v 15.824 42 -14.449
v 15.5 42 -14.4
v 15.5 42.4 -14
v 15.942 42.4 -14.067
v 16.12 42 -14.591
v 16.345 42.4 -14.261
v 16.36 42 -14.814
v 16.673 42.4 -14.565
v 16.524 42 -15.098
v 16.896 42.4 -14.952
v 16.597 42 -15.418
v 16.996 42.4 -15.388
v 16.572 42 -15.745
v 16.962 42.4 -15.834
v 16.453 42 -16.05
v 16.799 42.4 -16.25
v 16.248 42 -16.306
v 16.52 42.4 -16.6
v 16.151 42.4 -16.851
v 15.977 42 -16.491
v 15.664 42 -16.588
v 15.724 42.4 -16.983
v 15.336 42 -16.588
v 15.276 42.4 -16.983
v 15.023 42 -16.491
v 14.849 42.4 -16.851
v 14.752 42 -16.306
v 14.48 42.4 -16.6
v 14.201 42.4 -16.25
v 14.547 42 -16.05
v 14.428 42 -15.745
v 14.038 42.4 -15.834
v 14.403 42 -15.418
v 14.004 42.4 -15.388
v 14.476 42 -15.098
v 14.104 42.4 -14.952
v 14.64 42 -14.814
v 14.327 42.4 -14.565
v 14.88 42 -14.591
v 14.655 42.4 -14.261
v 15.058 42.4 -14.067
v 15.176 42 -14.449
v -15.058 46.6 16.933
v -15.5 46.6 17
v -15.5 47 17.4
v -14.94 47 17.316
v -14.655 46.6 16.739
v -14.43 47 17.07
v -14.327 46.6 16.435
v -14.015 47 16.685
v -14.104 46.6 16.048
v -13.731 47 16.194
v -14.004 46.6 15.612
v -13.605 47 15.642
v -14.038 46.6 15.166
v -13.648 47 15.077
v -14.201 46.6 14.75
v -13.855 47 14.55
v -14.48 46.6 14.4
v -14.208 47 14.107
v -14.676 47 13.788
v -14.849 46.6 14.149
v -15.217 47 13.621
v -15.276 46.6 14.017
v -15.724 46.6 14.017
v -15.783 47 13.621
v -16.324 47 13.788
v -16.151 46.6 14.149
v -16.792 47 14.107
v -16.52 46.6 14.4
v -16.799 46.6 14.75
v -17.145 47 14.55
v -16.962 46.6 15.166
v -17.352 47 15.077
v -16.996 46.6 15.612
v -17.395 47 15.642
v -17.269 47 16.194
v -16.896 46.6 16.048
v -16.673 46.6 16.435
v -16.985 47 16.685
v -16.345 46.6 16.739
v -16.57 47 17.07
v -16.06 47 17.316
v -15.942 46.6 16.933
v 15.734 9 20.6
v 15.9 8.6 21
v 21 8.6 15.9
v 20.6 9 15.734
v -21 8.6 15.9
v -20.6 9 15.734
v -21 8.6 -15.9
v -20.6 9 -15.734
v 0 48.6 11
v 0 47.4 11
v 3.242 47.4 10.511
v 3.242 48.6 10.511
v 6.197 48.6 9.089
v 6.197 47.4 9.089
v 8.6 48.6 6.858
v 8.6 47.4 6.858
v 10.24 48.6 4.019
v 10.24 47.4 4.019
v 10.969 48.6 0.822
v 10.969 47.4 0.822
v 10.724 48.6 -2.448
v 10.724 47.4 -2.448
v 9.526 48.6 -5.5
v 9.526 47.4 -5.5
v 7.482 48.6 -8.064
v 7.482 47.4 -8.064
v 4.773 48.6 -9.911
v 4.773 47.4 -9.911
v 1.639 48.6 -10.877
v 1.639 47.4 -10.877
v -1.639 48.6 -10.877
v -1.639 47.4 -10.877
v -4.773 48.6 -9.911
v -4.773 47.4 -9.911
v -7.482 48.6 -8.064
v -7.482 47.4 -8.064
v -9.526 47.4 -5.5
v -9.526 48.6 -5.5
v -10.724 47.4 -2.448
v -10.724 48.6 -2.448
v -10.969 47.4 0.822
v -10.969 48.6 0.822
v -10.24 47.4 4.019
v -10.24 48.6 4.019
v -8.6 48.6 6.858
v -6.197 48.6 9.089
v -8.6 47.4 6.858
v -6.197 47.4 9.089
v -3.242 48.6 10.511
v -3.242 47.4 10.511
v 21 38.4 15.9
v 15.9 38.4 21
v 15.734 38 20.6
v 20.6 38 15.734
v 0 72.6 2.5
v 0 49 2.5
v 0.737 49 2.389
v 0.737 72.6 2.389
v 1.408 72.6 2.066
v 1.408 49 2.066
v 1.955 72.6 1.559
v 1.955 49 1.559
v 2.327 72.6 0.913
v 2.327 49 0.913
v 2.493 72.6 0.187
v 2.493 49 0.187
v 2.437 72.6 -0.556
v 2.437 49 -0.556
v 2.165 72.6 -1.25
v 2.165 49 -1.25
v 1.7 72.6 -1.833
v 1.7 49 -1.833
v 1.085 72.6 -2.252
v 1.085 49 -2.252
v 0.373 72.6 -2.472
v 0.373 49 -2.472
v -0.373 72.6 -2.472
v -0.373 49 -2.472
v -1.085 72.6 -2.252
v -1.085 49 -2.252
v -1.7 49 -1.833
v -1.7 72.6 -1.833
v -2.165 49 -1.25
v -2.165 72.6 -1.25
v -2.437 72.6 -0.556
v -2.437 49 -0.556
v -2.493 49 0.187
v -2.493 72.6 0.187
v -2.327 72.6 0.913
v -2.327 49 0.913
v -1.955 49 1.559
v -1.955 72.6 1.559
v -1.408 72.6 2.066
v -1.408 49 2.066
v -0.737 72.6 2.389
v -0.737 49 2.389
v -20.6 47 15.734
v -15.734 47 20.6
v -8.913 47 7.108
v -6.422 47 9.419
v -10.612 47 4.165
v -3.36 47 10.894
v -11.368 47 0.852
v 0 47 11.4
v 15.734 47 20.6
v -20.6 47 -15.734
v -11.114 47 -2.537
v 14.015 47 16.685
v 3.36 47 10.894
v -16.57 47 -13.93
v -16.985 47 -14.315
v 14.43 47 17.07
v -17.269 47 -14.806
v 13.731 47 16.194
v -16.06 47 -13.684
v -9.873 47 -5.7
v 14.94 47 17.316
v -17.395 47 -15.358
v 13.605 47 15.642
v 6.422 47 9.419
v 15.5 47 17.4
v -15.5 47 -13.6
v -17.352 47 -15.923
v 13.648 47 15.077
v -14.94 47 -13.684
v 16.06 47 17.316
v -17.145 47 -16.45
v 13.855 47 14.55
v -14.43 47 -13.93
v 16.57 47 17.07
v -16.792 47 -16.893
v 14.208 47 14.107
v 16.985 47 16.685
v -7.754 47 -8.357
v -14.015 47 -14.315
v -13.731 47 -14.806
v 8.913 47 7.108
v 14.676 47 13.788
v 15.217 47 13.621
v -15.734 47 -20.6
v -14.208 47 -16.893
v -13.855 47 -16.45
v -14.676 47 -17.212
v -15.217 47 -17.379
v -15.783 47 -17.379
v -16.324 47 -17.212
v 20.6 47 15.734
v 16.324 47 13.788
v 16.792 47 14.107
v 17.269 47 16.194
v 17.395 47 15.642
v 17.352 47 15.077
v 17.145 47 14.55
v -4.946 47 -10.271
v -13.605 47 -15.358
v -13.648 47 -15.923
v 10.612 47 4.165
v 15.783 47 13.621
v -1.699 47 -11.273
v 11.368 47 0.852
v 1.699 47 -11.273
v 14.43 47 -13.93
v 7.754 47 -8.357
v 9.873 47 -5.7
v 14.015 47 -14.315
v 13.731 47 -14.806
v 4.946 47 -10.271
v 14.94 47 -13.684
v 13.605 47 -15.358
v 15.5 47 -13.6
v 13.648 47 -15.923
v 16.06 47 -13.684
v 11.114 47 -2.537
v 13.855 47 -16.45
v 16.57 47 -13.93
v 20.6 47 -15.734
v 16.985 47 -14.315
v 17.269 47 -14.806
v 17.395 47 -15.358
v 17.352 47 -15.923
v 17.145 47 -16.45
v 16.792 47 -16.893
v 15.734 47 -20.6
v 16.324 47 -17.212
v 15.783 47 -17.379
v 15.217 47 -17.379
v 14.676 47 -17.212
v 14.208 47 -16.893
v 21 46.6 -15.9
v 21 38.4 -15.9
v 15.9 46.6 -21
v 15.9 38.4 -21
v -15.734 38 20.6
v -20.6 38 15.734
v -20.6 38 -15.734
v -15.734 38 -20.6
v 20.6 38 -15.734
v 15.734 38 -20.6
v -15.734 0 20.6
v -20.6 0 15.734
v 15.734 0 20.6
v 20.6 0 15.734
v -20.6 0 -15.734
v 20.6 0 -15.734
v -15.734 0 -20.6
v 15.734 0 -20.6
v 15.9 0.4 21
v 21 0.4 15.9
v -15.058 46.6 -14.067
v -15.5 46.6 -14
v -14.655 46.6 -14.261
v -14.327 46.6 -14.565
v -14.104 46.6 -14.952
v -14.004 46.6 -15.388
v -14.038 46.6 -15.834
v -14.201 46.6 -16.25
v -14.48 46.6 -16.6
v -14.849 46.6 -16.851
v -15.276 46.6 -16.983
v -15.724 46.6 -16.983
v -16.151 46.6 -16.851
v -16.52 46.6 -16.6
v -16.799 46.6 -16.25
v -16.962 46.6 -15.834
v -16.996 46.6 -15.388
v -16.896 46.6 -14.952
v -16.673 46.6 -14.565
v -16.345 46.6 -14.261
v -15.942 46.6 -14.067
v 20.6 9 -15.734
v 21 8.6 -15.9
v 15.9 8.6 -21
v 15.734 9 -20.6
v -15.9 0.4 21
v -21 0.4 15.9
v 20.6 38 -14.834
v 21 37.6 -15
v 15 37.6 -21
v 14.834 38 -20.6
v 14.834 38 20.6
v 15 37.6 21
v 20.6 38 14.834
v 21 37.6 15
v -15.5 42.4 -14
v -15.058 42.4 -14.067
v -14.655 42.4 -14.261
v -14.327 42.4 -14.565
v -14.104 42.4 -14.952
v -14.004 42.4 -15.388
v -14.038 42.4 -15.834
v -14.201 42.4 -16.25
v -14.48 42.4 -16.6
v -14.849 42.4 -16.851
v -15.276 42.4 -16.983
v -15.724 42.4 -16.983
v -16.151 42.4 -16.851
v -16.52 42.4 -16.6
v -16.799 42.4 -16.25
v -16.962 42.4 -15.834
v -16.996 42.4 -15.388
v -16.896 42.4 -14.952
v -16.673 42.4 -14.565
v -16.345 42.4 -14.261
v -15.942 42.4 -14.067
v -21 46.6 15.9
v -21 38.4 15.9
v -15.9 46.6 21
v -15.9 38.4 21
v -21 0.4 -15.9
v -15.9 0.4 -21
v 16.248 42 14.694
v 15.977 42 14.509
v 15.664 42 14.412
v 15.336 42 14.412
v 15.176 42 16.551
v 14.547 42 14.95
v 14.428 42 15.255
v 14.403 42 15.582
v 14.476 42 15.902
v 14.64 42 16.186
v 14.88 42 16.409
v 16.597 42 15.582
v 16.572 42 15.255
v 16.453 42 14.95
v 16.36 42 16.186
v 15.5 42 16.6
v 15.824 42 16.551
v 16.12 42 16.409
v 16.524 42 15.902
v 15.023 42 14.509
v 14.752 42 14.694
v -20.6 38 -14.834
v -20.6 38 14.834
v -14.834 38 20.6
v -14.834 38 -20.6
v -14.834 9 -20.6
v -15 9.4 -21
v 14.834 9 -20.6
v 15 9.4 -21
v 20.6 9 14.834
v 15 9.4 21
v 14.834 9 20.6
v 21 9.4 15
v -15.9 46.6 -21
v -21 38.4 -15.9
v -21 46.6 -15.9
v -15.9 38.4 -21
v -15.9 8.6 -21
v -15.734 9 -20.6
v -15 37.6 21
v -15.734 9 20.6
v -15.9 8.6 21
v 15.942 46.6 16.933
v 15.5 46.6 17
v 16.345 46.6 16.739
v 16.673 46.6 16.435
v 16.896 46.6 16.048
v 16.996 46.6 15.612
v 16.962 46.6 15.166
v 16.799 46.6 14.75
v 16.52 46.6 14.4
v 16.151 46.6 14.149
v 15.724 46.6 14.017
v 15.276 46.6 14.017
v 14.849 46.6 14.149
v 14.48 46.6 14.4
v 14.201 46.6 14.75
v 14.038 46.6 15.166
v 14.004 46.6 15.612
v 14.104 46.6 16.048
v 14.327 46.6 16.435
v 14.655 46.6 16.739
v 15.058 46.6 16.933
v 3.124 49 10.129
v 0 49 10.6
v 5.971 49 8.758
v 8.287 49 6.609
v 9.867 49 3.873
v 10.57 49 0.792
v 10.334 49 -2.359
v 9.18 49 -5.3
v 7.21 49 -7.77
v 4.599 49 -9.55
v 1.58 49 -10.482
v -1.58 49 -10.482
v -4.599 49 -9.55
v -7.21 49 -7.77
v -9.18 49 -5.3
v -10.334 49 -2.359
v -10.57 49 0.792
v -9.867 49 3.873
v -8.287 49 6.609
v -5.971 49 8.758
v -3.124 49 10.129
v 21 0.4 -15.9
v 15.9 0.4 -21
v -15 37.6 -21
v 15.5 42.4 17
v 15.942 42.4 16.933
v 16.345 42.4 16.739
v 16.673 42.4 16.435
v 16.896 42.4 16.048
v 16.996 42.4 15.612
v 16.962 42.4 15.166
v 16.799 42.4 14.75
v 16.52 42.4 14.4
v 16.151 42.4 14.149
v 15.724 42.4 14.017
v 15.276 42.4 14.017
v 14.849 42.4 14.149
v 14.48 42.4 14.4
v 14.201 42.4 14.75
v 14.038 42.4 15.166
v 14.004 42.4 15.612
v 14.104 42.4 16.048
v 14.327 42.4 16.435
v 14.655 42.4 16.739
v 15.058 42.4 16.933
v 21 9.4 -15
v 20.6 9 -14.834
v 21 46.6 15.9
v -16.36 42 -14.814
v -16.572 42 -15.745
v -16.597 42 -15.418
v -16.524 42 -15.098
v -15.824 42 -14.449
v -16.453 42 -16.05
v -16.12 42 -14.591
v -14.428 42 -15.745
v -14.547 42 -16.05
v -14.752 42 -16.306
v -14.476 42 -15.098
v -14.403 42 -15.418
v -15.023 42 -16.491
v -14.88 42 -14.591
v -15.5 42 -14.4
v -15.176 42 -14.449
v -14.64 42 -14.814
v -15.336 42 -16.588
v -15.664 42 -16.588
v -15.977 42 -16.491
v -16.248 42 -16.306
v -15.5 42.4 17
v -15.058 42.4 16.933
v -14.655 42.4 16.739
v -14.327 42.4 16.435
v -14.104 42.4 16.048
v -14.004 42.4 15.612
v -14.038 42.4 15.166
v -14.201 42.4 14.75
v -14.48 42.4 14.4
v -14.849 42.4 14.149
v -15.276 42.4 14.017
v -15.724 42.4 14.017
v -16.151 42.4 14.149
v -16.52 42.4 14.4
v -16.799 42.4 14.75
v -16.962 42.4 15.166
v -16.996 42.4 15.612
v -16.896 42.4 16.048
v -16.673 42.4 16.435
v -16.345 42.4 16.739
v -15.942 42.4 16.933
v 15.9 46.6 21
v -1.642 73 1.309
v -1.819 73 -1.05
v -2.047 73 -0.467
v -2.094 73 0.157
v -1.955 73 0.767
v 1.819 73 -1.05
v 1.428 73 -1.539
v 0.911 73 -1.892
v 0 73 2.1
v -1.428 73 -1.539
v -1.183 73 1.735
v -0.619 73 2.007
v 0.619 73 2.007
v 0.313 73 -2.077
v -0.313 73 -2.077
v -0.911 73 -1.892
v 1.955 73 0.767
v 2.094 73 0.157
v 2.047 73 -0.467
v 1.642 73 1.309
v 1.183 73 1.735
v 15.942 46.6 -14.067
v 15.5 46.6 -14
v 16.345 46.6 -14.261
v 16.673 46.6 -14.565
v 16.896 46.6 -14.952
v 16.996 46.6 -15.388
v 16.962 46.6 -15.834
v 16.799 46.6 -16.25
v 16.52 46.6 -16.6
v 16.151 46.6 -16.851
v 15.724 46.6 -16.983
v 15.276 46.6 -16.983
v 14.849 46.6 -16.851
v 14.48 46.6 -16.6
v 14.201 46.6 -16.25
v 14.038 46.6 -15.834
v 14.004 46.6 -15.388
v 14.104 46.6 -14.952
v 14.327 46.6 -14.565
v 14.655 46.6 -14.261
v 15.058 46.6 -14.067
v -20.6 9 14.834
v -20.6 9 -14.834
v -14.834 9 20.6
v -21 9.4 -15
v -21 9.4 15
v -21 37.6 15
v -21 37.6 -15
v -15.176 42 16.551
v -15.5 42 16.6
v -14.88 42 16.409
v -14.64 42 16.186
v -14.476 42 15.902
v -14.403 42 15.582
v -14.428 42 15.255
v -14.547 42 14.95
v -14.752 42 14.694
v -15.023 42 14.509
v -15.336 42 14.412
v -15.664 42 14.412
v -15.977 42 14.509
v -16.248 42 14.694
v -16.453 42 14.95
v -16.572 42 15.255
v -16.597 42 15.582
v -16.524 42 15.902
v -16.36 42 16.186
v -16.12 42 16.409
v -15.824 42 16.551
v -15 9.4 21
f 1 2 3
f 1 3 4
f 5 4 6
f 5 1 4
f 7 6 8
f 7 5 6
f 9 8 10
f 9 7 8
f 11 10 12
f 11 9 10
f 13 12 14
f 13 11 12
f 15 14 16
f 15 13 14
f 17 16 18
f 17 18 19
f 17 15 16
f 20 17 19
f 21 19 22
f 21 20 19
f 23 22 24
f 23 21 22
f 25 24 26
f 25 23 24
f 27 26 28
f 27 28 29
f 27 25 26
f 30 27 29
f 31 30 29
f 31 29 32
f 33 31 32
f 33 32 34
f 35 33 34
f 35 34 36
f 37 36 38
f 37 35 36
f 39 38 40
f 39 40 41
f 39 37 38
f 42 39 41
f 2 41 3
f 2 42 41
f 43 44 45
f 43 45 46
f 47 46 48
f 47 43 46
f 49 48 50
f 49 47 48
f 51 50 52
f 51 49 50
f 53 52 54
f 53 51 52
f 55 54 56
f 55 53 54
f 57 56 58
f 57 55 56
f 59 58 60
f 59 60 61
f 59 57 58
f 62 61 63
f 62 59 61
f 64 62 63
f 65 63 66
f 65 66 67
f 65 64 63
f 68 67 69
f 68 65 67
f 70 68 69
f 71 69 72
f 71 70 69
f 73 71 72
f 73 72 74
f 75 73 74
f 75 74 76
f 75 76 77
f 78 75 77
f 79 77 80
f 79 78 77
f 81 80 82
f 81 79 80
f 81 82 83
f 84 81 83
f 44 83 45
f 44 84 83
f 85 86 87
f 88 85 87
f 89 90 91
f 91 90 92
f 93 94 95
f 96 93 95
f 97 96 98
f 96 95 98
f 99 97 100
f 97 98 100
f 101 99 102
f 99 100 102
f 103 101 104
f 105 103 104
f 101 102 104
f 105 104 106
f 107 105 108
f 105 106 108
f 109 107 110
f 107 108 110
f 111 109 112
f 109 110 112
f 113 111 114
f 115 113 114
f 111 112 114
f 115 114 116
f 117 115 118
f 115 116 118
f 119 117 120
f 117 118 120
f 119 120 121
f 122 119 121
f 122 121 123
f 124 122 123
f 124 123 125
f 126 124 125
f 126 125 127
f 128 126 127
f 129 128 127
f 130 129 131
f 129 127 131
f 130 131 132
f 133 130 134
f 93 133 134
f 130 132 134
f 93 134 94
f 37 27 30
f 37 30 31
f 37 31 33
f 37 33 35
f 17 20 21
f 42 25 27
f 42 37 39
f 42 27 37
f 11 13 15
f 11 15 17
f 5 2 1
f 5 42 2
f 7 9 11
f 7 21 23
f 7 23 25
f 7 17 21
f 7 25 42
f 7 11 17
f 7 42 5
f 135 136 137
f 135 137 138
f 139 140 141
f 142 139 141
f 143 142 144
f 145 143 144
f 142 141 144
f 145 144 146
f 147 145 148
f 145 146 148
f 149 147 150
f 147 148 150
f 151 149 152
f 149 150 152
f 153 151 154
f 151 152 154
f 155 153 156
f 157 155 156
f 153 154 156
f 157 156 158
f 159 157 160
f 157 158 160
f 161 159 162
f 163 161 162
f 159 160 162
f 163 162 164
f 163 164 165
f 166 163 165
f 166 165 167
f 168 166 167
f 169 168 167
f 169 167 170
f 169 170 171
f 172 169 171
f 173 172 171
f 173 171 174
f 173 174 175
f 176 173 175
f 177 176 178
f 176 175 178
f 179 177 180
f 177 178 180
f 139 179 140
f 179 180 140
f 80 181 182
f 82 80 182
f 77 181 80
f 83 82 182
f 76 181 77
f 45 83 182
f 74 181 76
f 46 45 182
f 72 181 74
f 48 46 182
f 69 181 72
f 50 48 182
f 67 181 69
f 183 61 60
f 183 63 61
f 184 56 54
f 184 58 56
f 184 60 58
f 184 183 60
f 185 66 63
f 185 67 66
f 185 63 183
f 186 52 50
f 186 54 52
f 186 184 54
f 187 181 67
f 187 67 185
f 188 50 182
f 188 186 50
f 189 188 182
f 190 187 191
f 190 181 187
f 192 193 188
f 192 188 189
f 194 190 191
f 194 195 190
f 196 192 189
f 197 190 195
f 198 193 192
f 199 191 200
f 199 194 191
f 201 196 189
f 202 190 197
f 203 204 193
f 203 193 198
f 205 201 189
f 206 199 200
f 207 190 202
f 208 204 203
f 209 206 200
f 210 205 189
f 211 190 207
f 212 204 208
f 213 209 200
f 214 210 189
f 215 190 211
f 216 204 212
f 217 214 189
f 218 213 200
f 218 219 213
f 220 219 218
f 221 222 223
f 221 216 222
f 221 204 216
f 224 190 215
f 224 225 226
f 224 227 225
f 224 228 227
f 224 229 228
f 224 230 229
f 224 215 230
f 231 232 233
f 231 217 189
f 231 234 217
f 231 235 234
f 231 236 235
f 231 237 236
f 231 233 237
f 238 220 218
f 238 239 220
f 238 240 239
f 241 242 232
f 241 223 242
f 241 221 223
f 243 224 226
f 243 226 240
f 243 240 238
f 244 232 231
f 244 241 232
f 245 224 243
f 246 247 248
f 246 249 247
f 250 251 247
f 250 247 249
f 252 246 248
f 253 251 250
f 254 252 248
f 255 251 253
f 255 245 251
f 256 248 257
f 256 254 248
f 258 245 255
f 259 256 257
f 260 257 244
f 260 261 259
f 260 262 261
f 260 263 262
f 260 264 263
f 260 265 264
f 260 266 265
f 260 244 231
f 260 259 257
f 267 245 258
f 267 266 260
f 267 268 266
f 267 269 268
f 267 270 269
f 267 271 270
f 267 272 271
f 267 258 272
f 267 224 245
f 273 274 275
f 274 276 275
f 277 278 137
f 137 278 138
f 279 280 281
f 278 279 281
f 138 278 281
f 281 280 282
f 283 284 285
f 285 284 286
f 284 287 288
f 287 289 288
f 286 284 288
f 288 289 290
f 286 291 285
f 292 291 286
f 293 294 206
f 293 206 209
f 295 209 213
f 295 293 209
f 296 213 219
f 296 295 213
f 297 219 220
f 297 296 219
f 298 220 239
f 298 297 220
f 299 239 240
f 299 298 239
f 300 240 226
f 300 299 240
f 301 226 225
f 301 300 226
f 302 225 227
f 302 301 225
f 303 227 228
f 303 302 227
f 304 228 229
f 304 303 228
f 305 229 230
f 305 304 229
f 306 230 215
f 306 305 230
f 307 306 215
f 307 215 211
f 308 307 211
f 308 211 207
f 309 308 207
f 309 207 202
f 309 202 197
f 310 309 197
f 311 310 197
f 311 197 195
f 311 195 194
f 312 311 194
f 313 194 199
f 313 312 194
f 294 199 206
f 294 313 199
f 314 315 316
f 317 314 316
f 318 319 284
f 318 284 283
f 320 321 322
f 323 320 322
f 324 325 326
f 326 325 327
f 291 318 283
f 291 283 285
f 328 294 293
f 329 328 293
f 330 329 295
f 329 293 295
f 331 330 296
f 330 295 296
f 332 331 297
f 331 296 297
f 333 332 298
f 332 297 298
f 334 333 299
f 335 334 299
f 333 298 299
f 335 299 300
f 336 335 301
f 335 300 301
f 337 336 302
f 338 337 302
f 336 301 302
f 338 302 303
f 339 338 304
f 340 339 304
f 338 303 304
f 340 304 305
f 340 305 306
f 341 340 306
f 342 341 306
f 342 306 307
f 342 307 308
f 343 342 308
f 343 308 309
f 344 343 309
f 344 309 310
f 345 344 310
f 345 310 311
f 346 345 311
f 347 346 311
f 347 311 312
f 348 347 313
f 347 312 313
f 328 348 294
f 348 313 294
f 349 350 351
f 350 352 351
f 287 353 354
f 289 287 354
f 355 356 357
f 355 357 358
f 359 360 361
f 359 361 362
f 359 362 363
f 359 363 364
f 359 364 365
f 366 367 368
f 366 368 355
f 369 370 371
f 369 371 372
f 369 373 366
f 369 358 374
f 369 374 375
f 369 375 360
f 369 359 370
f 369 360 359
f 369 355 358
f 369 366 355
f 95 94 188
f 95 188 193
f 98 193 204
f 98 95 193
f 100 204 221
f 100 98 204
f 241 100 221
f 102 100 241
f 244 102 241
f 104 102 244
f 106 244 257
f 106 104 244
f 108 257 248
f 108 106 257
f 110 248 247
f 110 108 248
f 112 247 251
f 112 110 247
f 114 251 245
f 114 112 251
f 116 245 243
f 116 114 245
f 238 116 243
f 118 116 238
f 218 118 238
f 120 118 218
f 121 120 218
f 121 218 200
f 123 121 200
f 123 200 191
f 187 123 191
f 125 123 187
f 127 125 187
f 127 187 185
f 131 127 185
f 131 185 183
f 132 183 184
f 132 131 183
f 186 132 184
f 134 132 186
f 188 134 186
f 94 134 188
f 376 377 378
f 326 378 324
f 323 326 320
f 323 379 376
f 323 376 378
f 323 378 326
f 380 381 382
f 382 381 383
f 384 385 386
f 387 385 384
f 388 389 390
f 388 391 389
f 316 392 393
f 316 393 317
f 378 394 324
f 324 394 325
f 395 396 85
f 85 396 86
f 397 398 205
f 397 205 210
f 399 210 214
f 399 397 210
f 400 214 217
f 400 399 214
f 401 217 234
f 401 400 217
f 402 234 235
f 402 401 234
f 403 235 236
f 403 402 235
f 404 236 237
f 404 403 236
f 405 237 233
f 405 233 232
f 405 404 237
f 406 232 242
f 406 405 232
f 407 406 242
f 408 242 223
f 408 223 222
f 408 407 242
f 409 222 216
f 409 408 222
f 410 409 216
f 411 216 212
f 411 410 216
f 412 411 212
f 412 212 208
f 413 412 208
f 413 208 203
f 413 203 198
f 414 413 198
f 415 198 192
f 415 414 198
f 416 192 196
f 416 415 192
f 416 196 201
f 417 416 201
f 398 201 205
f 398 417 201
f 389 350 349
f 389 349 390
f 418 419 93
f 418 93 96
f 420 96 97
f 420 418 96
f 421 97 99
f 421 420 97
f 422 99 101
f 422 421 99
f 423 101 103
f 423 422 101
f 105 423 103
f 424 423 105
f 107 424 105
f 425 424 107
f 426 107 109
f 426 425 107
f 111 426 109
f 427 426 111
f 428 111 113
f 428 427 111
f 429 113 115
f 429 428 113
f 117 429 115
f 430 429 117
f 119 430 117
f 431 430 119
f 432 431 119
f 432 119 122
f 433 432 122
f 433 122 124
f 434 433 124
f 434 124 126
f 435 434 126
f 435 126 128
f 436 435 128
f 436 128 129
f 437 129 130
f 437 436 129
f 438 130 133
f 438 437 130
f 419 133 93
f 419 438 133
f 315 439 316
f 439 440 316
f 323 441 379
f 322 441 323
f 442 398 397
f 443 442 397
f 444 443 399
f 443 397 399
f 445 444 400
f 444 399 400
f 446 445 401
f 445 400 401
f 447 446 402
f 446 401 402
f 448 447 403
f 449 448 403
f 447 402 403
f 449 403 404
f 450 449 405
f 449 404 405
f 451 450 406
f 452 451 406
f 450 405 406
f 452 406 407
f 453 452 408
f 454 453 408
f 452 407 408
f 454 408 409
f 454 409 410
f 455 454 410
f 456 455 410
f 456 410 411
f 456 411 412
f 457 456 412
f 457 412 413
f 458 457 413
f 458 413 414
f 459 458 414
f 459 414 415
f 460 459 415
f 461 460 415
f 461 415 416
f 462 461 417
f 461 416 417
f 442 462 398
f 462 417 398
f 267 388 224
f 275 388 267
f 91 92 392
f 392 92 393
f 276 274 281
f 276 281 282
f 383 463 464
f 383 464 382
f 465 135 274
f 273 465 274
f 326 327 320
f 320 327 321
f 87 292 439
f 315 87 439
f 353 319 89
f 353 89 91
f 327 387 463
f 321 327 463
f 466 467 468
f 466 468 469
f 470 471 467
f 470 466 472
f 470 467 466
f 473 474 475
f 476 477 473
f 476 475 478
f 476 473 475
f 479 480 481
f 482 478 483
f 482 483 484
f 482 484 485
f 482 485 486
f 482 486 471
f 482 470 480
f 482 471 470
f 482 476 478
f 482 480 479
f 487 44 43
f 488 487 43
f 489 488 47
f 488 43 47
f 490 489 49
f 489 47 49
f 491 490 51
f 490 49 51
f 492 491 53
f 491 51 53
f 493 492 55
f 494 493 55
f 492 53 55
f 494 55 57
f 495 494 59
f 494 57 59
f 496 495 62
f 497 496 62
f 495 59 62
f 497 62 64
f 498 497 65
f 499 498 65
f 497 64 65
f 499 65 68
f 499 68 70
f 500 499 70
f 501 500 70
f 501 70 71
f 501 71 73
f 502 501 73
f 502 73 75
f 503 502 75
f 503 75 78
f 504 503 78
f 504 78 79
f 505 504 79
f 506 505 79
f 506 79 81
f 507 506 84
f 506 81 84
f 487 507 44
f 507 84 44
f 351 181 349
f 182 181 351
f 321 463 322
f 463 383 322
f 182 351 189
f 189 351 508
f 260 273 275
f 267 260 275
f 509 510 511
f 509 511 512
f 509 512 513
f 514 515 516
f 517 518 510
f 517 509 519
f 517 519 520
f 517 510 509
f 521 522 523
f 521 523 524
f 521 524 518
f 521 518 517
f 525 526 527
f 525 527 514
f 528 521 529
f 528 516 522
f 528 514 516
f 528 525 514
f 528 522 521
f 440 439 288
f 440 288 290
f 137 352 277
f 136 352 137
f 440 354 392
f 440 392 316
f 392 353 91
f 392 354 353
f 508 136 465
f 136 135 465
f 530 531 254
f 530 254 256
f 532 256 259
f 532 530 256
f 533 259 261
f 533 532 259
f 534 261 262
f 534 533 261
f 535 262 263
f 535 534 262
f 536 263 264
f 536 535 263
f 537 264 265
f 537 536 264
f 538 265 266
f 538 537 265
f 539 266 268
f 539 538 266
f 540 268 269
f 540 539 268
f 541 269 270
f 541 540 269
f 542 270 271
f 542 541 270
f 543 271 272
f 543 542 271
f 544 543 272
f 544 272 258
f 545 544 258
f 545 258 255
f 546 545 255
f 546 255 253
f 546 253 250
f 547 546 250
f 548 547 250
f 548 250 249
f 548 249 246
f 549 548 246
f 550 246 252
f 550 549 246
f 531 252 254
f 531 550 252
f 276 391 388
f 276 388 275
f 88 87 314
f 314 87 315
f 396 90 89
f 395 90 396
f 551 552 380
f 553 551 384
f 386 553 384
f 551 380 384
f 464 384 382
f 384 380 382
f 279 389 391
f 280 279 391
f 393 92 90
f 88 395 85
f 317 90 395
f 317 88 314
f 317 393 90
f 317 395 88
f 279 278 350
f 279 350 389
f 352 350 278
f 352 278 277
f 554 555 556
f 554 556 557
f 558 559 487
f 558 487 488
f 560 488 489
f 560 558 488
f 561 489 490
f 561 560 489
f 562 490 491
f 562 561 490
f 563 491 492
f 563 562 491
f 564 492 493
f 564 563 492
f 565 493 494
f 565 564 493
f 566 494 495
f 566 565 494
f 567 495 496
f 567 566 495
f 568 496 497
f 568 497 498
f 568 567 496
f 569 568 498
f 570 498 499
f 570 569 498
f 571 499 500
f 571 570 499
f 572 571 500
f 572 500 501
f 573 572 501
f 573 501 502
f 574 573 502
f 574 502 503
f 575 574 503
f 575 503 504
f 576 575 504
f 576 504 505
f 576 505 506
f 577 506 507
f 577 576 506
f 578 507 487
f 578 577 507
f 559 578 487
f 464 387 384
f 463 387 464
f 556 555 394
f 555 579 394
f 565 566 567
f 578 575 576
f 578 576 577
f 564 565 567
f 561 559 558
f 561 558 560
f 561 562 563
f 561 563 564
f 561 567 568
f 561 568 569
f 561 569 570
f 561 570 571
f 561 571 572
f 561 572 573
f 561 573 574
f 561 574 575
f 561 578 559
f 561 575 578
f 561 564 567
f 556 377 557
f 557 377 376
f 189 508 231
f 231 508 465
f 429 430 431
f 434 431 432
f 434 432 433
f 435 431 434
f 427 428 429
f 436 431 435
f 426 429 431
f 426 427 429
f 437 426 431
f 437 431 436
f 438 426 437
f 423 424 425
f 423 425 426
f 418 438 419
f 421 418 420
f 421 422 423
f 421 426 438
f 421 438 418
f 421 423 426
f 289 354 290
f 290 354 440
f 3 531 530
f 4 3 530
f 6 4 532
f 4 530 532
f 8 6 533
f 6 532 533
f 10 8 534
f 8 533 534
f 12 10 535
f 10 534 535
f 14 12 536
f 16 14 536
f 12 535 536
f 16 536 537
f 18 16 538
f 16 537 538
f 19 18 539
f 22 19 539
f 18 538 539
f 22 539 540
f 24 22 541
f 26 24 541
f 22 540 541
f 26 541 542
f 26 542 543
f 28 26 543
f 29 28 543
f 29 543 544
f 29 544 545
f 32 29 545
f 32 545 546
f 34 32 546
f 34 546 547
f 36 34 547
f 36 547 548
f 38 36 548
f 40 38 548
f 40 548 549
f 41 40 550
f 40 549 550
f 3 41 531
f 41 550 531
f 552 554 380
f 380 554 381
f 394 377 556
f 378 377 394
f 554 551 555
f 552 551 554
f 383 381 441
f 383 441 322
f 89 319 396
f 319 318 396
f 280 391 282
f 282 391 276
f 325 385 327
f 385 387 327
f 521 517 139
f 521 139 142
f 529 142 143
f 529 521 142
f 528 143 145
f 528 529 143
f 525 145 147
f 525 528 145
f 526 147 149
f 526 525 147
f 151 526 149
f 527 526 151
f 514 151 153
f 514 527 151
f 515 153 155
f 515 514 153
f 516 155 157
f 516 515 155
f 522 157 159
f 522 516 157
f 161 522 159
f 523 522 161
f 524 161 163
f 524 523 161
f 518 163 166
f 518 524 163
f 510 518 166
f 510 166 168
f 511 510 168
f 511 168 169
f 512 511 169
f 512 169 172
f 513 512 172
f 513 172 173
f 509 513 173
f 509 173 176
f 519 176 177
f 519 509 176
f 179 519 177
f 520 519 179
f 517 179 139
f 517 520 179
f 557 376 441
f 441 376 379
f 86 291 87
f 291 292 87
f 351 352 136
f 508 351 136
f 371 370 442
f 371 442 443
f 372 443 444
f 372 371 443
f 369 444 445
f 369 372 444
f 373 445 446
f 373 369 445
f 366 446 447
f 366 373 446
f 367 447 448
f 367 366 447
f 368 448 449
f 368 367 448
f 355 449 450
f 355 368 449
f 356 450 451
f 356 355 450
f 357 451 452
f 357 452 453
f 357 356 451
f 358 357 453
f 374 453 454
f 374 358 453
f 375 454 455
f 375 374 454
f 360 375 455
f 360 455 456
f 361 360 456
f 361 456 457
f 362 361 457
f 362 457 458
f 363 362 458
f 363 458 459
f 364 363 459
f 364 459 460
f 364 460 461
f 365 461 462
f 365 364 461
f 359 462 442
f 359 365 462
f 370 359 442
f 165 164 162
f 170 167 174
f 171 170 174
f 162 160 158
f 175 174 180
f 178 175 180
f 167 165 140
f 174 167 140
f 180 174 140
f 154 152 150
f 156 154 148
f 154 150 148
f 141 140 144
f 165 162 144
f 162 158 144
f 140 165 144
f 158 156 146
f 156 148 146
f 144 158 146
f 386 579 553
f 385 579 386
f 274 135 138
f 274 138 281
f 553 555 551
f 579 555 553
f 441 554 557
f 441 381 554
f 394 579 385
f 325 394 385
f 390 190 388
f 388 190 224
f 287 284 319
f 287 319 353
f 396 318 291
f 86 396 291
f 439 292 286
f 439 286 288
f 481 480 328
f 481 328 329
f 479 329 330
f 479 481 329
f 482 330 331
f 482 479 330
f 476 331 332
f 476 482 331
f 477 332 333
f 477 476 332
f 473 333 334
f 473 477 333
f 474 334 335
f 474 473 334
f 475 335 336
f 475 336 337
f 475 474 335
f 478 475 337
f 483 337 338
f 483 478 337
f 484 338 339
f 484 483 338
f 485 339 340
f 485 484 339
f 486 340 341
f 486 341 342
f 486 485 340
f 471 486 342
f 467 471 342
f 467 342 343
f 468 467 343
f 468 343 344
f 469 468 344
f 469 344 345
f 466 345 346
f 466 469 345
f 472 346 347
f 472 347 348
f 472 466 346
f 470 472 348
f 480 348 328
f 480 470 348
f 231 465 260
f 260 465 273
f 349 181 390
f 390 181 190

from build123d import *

# Parameters (mm, degrees)
SKETCH1_W           = 42
SKETCH1_H           = 42
BOSS_EXTRUDE1_DEPTH = 9
CHAMFER1_SIZE       = 5.1
CHAMFER2_SIZE       = 0.4
SKETCH3_W           = 42
SKETCH3_H           = 42
BOSS_EXTRUDE3_DEPTH = 29
CHAMFER3_SIZE       = 6
CHAMFER4_SIZE       = 0.4
SKETCH4_W           = 42
SKETCH4_H           = 42
BOSS_EXTRUDE4_DEPTH = 9
CHAMFER5_SIZE       = 5.1
SKETCH5_R           = 11
BOSS_EXTRUDE5_DEPTH = 2
SKETCH7_R           = 1.5
CUT_EXTRUDE1_DEPTH  = 5
CHAMFER6_SIZE       = 0.4
SKETCH6_R           = 2.5
BOSS_EXTRUDE6_DEPTH = 24
CHAMFER7_SIZE       = 0.4


with BuildPart() as part:
    # Sketch1 → Boss-Extrude1 (new body)
    with BuildSketch(Plane(origin=(0, 0, 0), x_dir=(1, 0, 0), z_dir=(0, 1, 0))):
        Rectangle(SKETCH1_W, SKETCH1_H)
    extrude(amount=BOSS_EXTRUDE1_DEPTH)

    # Chamfer1
    chamfer1_edges = [part.edges().sort_by_distance(p)[0] for p in [
        (21, 4.5, 21),
        (-21, 4.5, 21),
        (-21, 4.5, -21),
        (21, 4.5, -21),
    ]]
    chamfer(chamfer1_edges, length=CHAMFER1_SIZE)

    # Chamfer2
    chamfer2_edges = [part.edges().sort_by_distance(p)[0] for p in [
        (-21, 0, 0),
        (-21, 9, 0),
        (21, 0, 0),
        (0, 0, 21),
        (0, 0, -21),
        (-18.45, 0, 18.45),
        (18.45, 0, 18.45),
        (18.45, 0, -18.45),
        (-18.45, 0, -18.45),
        (0, 9, -21),
        (21, 9, 0),
        (0, 9, 21),
        (-18.45, 9, 18.45),
        (18.45, 9, 18.45),
        (18.45, 9, -18.45),
        (-18.45, 9, -18.45),
    ]]
    chamfer(chamfer2_edges, length=CHAMFER2_SIZE)


with BuildPart() as body_2:
    # Sketch3 → Boss-Extrude3 (new body)
    with BuildSketch(Plane(origin=(0, 9, 0), x_dir=(1, 0, 0), z_dir=(0, 1, 0))):
        Rectangle(SKETCH3_W, SKETCH3_H)
    extrude(amount=BOSS_EXTRUDE3_DEPTH)

    # Chamfer3
    chamfer3_edges = [body_2.edges().sort_by_distance(p)[0] for p in [
        (-21, 23.5, -21),
        (21, 23.5, -21),
        (21, 23.5, 21),
        (-21, 23.5, 21),
    ]]
    chamfer(chamfer3_edges, length=CHAMFER3_SIZE)

    # Chamfer4
    chamfer4_edges = [body_2.edges().sort_by_distance(p)[0] for p in [
        (-21, 9, 0),
        (-21, 38, 0),
        (0, 9, -21),
        (21, 9, 0),
        (0, 9, 21),
        (18, 9, 18),
        (-18, 9, 18),
        (18, 9, -18),
        (-18, 9, -18),
        (0, 38, -21),
        (0, 38, 21),
        (21, 38, 0),
        (18, 38, 18),
        (-18, 38, 18),
        (18, 38, -18),
        (-18, 38, -18),
    ]]
    chamfer(chamfer4_edges, length=CHAMFER4_SIZE)


with BuildPart() as body_3:
    # Sketch4 → Boss-Extrude4 (new body)
    with BuildSketch(Plane(origin=(0, 38, 0), x_dir=(1, 0, 0), z_dir=(0, 1, 0))):
        Rectangle(SKETCH4_W, SKETCH4_H)
    extrude(amount=BOSS_EXTRUDE4_DEPTH)

    # Chamfer5
    chamfer5_edges = [body_3.edges().sort_by_distance(p)[0] for p in [
        (-21, 42.5, -21),
        (21, 42.5, -21),
        (21, 42.5, 21),
        (-21, 42.5, 21),
    ]]
    chamfer(chamfer5_edges, length=CHAMFER5_SIZE)

    # Sketch5 → Boss-Extrude5 (add)
    with BuildSketch(Plane(origin=(0, 47, 0), x_dir=(1, 0, 0), z_dir=(0, 1, 0))):
        with Locations(Location((0, 0, 0), (0, 0, 270))):
            Circle(SKETCH5_R)
    extrude(amount=BOSS_EXTRUDE5_DEPTH)

    # Sketch7 → Cut-Extrude1 (cut)
    with BuildSketch(Plane(origin=(0, 47, 0), x_dir=(1, 0, 0), z_dir=(0, 1, 0))):
        with Locations(Location((15.5, -15.5, 0), (0, 0, 270))):
            Circle(SKETCH7_R)
        with Locations(Location((-15.5, -15.5, 0), (0, 0, 270))):
            Circle(SKETCH7_R)
        with Locations(Location((15.5, 15.5, 0), (0, 0, 270))):
            Circle(SKETCH7_R)
        with Locations(Location((-15.5, 15.5, 0), (0, 0, 270))):
            Circle(SKETCH7_R)
    extrude(amount=-CUT_EXTRUDE1_DEPTH, mode=Mode.SUBTRACT)

    # Chamfer6
    chamfer6_edges = [body_3.edges().sort_by_distance(p)[0] for p in [
        (21, 38, 0),
        (21, 47, 0),
        (-21, 38, 0),
        (0, 38, -21),
        (0, 38, 21),
        (18.45, 38, -18.45),
        (-18.45, 38, -18.45),
        (-18.45, 38, 18.45),
        (18.45, 38, 18.45),
        (0, 47, 21),
        (-21, 47, 0),
        (0, 47, -21),
        (18.45, 47, -18.45),
        (-18.45, 47, -18.45),
        (-18.45, 47, 18.45),
        (18.45, 47, 18.45),
        (0, 47, -11),
        (0, 49, -11),
        (-15.5, 42, 14),
        (-15.5, 47, 14),
        (15.5, 42, -17),
        (15.5, 47, -17),
        (-15.5, 42, -17),
        (-15.5, 47, -17),
        (15.5, 42, 14),
        (15.5, 47, 14),
    ]]
    chamfer(chamfer6_edges, length=CHAMFER6_SIZE)


with BuildPart() as body_4:
    # Sketch6 → Boss-Extrude6 (new body)
    with BuildSketch(Plane(origin=(0, 49, 0), x_dir=(1, 0, 0), z_dir=(0, 1, 0))):
        with Locations(Location((0, 0, 0), (0, 0, 270))):
            Circle(SKETCH6_R)
    extrude(amount=BOSS_EXTRUDE6_DEPTH)

    # Chamfer7
    chamfer7_edges = [body_4.edges().sort_by_distance(p)[0] for p in [
        (0, 73, -2.5),
    ]]
    chamfer(chamfer7_edges, length=CHAMFER7_SIZE)


solid = Compound([part.part, body_2.part, body_3.part, body_4.part])
